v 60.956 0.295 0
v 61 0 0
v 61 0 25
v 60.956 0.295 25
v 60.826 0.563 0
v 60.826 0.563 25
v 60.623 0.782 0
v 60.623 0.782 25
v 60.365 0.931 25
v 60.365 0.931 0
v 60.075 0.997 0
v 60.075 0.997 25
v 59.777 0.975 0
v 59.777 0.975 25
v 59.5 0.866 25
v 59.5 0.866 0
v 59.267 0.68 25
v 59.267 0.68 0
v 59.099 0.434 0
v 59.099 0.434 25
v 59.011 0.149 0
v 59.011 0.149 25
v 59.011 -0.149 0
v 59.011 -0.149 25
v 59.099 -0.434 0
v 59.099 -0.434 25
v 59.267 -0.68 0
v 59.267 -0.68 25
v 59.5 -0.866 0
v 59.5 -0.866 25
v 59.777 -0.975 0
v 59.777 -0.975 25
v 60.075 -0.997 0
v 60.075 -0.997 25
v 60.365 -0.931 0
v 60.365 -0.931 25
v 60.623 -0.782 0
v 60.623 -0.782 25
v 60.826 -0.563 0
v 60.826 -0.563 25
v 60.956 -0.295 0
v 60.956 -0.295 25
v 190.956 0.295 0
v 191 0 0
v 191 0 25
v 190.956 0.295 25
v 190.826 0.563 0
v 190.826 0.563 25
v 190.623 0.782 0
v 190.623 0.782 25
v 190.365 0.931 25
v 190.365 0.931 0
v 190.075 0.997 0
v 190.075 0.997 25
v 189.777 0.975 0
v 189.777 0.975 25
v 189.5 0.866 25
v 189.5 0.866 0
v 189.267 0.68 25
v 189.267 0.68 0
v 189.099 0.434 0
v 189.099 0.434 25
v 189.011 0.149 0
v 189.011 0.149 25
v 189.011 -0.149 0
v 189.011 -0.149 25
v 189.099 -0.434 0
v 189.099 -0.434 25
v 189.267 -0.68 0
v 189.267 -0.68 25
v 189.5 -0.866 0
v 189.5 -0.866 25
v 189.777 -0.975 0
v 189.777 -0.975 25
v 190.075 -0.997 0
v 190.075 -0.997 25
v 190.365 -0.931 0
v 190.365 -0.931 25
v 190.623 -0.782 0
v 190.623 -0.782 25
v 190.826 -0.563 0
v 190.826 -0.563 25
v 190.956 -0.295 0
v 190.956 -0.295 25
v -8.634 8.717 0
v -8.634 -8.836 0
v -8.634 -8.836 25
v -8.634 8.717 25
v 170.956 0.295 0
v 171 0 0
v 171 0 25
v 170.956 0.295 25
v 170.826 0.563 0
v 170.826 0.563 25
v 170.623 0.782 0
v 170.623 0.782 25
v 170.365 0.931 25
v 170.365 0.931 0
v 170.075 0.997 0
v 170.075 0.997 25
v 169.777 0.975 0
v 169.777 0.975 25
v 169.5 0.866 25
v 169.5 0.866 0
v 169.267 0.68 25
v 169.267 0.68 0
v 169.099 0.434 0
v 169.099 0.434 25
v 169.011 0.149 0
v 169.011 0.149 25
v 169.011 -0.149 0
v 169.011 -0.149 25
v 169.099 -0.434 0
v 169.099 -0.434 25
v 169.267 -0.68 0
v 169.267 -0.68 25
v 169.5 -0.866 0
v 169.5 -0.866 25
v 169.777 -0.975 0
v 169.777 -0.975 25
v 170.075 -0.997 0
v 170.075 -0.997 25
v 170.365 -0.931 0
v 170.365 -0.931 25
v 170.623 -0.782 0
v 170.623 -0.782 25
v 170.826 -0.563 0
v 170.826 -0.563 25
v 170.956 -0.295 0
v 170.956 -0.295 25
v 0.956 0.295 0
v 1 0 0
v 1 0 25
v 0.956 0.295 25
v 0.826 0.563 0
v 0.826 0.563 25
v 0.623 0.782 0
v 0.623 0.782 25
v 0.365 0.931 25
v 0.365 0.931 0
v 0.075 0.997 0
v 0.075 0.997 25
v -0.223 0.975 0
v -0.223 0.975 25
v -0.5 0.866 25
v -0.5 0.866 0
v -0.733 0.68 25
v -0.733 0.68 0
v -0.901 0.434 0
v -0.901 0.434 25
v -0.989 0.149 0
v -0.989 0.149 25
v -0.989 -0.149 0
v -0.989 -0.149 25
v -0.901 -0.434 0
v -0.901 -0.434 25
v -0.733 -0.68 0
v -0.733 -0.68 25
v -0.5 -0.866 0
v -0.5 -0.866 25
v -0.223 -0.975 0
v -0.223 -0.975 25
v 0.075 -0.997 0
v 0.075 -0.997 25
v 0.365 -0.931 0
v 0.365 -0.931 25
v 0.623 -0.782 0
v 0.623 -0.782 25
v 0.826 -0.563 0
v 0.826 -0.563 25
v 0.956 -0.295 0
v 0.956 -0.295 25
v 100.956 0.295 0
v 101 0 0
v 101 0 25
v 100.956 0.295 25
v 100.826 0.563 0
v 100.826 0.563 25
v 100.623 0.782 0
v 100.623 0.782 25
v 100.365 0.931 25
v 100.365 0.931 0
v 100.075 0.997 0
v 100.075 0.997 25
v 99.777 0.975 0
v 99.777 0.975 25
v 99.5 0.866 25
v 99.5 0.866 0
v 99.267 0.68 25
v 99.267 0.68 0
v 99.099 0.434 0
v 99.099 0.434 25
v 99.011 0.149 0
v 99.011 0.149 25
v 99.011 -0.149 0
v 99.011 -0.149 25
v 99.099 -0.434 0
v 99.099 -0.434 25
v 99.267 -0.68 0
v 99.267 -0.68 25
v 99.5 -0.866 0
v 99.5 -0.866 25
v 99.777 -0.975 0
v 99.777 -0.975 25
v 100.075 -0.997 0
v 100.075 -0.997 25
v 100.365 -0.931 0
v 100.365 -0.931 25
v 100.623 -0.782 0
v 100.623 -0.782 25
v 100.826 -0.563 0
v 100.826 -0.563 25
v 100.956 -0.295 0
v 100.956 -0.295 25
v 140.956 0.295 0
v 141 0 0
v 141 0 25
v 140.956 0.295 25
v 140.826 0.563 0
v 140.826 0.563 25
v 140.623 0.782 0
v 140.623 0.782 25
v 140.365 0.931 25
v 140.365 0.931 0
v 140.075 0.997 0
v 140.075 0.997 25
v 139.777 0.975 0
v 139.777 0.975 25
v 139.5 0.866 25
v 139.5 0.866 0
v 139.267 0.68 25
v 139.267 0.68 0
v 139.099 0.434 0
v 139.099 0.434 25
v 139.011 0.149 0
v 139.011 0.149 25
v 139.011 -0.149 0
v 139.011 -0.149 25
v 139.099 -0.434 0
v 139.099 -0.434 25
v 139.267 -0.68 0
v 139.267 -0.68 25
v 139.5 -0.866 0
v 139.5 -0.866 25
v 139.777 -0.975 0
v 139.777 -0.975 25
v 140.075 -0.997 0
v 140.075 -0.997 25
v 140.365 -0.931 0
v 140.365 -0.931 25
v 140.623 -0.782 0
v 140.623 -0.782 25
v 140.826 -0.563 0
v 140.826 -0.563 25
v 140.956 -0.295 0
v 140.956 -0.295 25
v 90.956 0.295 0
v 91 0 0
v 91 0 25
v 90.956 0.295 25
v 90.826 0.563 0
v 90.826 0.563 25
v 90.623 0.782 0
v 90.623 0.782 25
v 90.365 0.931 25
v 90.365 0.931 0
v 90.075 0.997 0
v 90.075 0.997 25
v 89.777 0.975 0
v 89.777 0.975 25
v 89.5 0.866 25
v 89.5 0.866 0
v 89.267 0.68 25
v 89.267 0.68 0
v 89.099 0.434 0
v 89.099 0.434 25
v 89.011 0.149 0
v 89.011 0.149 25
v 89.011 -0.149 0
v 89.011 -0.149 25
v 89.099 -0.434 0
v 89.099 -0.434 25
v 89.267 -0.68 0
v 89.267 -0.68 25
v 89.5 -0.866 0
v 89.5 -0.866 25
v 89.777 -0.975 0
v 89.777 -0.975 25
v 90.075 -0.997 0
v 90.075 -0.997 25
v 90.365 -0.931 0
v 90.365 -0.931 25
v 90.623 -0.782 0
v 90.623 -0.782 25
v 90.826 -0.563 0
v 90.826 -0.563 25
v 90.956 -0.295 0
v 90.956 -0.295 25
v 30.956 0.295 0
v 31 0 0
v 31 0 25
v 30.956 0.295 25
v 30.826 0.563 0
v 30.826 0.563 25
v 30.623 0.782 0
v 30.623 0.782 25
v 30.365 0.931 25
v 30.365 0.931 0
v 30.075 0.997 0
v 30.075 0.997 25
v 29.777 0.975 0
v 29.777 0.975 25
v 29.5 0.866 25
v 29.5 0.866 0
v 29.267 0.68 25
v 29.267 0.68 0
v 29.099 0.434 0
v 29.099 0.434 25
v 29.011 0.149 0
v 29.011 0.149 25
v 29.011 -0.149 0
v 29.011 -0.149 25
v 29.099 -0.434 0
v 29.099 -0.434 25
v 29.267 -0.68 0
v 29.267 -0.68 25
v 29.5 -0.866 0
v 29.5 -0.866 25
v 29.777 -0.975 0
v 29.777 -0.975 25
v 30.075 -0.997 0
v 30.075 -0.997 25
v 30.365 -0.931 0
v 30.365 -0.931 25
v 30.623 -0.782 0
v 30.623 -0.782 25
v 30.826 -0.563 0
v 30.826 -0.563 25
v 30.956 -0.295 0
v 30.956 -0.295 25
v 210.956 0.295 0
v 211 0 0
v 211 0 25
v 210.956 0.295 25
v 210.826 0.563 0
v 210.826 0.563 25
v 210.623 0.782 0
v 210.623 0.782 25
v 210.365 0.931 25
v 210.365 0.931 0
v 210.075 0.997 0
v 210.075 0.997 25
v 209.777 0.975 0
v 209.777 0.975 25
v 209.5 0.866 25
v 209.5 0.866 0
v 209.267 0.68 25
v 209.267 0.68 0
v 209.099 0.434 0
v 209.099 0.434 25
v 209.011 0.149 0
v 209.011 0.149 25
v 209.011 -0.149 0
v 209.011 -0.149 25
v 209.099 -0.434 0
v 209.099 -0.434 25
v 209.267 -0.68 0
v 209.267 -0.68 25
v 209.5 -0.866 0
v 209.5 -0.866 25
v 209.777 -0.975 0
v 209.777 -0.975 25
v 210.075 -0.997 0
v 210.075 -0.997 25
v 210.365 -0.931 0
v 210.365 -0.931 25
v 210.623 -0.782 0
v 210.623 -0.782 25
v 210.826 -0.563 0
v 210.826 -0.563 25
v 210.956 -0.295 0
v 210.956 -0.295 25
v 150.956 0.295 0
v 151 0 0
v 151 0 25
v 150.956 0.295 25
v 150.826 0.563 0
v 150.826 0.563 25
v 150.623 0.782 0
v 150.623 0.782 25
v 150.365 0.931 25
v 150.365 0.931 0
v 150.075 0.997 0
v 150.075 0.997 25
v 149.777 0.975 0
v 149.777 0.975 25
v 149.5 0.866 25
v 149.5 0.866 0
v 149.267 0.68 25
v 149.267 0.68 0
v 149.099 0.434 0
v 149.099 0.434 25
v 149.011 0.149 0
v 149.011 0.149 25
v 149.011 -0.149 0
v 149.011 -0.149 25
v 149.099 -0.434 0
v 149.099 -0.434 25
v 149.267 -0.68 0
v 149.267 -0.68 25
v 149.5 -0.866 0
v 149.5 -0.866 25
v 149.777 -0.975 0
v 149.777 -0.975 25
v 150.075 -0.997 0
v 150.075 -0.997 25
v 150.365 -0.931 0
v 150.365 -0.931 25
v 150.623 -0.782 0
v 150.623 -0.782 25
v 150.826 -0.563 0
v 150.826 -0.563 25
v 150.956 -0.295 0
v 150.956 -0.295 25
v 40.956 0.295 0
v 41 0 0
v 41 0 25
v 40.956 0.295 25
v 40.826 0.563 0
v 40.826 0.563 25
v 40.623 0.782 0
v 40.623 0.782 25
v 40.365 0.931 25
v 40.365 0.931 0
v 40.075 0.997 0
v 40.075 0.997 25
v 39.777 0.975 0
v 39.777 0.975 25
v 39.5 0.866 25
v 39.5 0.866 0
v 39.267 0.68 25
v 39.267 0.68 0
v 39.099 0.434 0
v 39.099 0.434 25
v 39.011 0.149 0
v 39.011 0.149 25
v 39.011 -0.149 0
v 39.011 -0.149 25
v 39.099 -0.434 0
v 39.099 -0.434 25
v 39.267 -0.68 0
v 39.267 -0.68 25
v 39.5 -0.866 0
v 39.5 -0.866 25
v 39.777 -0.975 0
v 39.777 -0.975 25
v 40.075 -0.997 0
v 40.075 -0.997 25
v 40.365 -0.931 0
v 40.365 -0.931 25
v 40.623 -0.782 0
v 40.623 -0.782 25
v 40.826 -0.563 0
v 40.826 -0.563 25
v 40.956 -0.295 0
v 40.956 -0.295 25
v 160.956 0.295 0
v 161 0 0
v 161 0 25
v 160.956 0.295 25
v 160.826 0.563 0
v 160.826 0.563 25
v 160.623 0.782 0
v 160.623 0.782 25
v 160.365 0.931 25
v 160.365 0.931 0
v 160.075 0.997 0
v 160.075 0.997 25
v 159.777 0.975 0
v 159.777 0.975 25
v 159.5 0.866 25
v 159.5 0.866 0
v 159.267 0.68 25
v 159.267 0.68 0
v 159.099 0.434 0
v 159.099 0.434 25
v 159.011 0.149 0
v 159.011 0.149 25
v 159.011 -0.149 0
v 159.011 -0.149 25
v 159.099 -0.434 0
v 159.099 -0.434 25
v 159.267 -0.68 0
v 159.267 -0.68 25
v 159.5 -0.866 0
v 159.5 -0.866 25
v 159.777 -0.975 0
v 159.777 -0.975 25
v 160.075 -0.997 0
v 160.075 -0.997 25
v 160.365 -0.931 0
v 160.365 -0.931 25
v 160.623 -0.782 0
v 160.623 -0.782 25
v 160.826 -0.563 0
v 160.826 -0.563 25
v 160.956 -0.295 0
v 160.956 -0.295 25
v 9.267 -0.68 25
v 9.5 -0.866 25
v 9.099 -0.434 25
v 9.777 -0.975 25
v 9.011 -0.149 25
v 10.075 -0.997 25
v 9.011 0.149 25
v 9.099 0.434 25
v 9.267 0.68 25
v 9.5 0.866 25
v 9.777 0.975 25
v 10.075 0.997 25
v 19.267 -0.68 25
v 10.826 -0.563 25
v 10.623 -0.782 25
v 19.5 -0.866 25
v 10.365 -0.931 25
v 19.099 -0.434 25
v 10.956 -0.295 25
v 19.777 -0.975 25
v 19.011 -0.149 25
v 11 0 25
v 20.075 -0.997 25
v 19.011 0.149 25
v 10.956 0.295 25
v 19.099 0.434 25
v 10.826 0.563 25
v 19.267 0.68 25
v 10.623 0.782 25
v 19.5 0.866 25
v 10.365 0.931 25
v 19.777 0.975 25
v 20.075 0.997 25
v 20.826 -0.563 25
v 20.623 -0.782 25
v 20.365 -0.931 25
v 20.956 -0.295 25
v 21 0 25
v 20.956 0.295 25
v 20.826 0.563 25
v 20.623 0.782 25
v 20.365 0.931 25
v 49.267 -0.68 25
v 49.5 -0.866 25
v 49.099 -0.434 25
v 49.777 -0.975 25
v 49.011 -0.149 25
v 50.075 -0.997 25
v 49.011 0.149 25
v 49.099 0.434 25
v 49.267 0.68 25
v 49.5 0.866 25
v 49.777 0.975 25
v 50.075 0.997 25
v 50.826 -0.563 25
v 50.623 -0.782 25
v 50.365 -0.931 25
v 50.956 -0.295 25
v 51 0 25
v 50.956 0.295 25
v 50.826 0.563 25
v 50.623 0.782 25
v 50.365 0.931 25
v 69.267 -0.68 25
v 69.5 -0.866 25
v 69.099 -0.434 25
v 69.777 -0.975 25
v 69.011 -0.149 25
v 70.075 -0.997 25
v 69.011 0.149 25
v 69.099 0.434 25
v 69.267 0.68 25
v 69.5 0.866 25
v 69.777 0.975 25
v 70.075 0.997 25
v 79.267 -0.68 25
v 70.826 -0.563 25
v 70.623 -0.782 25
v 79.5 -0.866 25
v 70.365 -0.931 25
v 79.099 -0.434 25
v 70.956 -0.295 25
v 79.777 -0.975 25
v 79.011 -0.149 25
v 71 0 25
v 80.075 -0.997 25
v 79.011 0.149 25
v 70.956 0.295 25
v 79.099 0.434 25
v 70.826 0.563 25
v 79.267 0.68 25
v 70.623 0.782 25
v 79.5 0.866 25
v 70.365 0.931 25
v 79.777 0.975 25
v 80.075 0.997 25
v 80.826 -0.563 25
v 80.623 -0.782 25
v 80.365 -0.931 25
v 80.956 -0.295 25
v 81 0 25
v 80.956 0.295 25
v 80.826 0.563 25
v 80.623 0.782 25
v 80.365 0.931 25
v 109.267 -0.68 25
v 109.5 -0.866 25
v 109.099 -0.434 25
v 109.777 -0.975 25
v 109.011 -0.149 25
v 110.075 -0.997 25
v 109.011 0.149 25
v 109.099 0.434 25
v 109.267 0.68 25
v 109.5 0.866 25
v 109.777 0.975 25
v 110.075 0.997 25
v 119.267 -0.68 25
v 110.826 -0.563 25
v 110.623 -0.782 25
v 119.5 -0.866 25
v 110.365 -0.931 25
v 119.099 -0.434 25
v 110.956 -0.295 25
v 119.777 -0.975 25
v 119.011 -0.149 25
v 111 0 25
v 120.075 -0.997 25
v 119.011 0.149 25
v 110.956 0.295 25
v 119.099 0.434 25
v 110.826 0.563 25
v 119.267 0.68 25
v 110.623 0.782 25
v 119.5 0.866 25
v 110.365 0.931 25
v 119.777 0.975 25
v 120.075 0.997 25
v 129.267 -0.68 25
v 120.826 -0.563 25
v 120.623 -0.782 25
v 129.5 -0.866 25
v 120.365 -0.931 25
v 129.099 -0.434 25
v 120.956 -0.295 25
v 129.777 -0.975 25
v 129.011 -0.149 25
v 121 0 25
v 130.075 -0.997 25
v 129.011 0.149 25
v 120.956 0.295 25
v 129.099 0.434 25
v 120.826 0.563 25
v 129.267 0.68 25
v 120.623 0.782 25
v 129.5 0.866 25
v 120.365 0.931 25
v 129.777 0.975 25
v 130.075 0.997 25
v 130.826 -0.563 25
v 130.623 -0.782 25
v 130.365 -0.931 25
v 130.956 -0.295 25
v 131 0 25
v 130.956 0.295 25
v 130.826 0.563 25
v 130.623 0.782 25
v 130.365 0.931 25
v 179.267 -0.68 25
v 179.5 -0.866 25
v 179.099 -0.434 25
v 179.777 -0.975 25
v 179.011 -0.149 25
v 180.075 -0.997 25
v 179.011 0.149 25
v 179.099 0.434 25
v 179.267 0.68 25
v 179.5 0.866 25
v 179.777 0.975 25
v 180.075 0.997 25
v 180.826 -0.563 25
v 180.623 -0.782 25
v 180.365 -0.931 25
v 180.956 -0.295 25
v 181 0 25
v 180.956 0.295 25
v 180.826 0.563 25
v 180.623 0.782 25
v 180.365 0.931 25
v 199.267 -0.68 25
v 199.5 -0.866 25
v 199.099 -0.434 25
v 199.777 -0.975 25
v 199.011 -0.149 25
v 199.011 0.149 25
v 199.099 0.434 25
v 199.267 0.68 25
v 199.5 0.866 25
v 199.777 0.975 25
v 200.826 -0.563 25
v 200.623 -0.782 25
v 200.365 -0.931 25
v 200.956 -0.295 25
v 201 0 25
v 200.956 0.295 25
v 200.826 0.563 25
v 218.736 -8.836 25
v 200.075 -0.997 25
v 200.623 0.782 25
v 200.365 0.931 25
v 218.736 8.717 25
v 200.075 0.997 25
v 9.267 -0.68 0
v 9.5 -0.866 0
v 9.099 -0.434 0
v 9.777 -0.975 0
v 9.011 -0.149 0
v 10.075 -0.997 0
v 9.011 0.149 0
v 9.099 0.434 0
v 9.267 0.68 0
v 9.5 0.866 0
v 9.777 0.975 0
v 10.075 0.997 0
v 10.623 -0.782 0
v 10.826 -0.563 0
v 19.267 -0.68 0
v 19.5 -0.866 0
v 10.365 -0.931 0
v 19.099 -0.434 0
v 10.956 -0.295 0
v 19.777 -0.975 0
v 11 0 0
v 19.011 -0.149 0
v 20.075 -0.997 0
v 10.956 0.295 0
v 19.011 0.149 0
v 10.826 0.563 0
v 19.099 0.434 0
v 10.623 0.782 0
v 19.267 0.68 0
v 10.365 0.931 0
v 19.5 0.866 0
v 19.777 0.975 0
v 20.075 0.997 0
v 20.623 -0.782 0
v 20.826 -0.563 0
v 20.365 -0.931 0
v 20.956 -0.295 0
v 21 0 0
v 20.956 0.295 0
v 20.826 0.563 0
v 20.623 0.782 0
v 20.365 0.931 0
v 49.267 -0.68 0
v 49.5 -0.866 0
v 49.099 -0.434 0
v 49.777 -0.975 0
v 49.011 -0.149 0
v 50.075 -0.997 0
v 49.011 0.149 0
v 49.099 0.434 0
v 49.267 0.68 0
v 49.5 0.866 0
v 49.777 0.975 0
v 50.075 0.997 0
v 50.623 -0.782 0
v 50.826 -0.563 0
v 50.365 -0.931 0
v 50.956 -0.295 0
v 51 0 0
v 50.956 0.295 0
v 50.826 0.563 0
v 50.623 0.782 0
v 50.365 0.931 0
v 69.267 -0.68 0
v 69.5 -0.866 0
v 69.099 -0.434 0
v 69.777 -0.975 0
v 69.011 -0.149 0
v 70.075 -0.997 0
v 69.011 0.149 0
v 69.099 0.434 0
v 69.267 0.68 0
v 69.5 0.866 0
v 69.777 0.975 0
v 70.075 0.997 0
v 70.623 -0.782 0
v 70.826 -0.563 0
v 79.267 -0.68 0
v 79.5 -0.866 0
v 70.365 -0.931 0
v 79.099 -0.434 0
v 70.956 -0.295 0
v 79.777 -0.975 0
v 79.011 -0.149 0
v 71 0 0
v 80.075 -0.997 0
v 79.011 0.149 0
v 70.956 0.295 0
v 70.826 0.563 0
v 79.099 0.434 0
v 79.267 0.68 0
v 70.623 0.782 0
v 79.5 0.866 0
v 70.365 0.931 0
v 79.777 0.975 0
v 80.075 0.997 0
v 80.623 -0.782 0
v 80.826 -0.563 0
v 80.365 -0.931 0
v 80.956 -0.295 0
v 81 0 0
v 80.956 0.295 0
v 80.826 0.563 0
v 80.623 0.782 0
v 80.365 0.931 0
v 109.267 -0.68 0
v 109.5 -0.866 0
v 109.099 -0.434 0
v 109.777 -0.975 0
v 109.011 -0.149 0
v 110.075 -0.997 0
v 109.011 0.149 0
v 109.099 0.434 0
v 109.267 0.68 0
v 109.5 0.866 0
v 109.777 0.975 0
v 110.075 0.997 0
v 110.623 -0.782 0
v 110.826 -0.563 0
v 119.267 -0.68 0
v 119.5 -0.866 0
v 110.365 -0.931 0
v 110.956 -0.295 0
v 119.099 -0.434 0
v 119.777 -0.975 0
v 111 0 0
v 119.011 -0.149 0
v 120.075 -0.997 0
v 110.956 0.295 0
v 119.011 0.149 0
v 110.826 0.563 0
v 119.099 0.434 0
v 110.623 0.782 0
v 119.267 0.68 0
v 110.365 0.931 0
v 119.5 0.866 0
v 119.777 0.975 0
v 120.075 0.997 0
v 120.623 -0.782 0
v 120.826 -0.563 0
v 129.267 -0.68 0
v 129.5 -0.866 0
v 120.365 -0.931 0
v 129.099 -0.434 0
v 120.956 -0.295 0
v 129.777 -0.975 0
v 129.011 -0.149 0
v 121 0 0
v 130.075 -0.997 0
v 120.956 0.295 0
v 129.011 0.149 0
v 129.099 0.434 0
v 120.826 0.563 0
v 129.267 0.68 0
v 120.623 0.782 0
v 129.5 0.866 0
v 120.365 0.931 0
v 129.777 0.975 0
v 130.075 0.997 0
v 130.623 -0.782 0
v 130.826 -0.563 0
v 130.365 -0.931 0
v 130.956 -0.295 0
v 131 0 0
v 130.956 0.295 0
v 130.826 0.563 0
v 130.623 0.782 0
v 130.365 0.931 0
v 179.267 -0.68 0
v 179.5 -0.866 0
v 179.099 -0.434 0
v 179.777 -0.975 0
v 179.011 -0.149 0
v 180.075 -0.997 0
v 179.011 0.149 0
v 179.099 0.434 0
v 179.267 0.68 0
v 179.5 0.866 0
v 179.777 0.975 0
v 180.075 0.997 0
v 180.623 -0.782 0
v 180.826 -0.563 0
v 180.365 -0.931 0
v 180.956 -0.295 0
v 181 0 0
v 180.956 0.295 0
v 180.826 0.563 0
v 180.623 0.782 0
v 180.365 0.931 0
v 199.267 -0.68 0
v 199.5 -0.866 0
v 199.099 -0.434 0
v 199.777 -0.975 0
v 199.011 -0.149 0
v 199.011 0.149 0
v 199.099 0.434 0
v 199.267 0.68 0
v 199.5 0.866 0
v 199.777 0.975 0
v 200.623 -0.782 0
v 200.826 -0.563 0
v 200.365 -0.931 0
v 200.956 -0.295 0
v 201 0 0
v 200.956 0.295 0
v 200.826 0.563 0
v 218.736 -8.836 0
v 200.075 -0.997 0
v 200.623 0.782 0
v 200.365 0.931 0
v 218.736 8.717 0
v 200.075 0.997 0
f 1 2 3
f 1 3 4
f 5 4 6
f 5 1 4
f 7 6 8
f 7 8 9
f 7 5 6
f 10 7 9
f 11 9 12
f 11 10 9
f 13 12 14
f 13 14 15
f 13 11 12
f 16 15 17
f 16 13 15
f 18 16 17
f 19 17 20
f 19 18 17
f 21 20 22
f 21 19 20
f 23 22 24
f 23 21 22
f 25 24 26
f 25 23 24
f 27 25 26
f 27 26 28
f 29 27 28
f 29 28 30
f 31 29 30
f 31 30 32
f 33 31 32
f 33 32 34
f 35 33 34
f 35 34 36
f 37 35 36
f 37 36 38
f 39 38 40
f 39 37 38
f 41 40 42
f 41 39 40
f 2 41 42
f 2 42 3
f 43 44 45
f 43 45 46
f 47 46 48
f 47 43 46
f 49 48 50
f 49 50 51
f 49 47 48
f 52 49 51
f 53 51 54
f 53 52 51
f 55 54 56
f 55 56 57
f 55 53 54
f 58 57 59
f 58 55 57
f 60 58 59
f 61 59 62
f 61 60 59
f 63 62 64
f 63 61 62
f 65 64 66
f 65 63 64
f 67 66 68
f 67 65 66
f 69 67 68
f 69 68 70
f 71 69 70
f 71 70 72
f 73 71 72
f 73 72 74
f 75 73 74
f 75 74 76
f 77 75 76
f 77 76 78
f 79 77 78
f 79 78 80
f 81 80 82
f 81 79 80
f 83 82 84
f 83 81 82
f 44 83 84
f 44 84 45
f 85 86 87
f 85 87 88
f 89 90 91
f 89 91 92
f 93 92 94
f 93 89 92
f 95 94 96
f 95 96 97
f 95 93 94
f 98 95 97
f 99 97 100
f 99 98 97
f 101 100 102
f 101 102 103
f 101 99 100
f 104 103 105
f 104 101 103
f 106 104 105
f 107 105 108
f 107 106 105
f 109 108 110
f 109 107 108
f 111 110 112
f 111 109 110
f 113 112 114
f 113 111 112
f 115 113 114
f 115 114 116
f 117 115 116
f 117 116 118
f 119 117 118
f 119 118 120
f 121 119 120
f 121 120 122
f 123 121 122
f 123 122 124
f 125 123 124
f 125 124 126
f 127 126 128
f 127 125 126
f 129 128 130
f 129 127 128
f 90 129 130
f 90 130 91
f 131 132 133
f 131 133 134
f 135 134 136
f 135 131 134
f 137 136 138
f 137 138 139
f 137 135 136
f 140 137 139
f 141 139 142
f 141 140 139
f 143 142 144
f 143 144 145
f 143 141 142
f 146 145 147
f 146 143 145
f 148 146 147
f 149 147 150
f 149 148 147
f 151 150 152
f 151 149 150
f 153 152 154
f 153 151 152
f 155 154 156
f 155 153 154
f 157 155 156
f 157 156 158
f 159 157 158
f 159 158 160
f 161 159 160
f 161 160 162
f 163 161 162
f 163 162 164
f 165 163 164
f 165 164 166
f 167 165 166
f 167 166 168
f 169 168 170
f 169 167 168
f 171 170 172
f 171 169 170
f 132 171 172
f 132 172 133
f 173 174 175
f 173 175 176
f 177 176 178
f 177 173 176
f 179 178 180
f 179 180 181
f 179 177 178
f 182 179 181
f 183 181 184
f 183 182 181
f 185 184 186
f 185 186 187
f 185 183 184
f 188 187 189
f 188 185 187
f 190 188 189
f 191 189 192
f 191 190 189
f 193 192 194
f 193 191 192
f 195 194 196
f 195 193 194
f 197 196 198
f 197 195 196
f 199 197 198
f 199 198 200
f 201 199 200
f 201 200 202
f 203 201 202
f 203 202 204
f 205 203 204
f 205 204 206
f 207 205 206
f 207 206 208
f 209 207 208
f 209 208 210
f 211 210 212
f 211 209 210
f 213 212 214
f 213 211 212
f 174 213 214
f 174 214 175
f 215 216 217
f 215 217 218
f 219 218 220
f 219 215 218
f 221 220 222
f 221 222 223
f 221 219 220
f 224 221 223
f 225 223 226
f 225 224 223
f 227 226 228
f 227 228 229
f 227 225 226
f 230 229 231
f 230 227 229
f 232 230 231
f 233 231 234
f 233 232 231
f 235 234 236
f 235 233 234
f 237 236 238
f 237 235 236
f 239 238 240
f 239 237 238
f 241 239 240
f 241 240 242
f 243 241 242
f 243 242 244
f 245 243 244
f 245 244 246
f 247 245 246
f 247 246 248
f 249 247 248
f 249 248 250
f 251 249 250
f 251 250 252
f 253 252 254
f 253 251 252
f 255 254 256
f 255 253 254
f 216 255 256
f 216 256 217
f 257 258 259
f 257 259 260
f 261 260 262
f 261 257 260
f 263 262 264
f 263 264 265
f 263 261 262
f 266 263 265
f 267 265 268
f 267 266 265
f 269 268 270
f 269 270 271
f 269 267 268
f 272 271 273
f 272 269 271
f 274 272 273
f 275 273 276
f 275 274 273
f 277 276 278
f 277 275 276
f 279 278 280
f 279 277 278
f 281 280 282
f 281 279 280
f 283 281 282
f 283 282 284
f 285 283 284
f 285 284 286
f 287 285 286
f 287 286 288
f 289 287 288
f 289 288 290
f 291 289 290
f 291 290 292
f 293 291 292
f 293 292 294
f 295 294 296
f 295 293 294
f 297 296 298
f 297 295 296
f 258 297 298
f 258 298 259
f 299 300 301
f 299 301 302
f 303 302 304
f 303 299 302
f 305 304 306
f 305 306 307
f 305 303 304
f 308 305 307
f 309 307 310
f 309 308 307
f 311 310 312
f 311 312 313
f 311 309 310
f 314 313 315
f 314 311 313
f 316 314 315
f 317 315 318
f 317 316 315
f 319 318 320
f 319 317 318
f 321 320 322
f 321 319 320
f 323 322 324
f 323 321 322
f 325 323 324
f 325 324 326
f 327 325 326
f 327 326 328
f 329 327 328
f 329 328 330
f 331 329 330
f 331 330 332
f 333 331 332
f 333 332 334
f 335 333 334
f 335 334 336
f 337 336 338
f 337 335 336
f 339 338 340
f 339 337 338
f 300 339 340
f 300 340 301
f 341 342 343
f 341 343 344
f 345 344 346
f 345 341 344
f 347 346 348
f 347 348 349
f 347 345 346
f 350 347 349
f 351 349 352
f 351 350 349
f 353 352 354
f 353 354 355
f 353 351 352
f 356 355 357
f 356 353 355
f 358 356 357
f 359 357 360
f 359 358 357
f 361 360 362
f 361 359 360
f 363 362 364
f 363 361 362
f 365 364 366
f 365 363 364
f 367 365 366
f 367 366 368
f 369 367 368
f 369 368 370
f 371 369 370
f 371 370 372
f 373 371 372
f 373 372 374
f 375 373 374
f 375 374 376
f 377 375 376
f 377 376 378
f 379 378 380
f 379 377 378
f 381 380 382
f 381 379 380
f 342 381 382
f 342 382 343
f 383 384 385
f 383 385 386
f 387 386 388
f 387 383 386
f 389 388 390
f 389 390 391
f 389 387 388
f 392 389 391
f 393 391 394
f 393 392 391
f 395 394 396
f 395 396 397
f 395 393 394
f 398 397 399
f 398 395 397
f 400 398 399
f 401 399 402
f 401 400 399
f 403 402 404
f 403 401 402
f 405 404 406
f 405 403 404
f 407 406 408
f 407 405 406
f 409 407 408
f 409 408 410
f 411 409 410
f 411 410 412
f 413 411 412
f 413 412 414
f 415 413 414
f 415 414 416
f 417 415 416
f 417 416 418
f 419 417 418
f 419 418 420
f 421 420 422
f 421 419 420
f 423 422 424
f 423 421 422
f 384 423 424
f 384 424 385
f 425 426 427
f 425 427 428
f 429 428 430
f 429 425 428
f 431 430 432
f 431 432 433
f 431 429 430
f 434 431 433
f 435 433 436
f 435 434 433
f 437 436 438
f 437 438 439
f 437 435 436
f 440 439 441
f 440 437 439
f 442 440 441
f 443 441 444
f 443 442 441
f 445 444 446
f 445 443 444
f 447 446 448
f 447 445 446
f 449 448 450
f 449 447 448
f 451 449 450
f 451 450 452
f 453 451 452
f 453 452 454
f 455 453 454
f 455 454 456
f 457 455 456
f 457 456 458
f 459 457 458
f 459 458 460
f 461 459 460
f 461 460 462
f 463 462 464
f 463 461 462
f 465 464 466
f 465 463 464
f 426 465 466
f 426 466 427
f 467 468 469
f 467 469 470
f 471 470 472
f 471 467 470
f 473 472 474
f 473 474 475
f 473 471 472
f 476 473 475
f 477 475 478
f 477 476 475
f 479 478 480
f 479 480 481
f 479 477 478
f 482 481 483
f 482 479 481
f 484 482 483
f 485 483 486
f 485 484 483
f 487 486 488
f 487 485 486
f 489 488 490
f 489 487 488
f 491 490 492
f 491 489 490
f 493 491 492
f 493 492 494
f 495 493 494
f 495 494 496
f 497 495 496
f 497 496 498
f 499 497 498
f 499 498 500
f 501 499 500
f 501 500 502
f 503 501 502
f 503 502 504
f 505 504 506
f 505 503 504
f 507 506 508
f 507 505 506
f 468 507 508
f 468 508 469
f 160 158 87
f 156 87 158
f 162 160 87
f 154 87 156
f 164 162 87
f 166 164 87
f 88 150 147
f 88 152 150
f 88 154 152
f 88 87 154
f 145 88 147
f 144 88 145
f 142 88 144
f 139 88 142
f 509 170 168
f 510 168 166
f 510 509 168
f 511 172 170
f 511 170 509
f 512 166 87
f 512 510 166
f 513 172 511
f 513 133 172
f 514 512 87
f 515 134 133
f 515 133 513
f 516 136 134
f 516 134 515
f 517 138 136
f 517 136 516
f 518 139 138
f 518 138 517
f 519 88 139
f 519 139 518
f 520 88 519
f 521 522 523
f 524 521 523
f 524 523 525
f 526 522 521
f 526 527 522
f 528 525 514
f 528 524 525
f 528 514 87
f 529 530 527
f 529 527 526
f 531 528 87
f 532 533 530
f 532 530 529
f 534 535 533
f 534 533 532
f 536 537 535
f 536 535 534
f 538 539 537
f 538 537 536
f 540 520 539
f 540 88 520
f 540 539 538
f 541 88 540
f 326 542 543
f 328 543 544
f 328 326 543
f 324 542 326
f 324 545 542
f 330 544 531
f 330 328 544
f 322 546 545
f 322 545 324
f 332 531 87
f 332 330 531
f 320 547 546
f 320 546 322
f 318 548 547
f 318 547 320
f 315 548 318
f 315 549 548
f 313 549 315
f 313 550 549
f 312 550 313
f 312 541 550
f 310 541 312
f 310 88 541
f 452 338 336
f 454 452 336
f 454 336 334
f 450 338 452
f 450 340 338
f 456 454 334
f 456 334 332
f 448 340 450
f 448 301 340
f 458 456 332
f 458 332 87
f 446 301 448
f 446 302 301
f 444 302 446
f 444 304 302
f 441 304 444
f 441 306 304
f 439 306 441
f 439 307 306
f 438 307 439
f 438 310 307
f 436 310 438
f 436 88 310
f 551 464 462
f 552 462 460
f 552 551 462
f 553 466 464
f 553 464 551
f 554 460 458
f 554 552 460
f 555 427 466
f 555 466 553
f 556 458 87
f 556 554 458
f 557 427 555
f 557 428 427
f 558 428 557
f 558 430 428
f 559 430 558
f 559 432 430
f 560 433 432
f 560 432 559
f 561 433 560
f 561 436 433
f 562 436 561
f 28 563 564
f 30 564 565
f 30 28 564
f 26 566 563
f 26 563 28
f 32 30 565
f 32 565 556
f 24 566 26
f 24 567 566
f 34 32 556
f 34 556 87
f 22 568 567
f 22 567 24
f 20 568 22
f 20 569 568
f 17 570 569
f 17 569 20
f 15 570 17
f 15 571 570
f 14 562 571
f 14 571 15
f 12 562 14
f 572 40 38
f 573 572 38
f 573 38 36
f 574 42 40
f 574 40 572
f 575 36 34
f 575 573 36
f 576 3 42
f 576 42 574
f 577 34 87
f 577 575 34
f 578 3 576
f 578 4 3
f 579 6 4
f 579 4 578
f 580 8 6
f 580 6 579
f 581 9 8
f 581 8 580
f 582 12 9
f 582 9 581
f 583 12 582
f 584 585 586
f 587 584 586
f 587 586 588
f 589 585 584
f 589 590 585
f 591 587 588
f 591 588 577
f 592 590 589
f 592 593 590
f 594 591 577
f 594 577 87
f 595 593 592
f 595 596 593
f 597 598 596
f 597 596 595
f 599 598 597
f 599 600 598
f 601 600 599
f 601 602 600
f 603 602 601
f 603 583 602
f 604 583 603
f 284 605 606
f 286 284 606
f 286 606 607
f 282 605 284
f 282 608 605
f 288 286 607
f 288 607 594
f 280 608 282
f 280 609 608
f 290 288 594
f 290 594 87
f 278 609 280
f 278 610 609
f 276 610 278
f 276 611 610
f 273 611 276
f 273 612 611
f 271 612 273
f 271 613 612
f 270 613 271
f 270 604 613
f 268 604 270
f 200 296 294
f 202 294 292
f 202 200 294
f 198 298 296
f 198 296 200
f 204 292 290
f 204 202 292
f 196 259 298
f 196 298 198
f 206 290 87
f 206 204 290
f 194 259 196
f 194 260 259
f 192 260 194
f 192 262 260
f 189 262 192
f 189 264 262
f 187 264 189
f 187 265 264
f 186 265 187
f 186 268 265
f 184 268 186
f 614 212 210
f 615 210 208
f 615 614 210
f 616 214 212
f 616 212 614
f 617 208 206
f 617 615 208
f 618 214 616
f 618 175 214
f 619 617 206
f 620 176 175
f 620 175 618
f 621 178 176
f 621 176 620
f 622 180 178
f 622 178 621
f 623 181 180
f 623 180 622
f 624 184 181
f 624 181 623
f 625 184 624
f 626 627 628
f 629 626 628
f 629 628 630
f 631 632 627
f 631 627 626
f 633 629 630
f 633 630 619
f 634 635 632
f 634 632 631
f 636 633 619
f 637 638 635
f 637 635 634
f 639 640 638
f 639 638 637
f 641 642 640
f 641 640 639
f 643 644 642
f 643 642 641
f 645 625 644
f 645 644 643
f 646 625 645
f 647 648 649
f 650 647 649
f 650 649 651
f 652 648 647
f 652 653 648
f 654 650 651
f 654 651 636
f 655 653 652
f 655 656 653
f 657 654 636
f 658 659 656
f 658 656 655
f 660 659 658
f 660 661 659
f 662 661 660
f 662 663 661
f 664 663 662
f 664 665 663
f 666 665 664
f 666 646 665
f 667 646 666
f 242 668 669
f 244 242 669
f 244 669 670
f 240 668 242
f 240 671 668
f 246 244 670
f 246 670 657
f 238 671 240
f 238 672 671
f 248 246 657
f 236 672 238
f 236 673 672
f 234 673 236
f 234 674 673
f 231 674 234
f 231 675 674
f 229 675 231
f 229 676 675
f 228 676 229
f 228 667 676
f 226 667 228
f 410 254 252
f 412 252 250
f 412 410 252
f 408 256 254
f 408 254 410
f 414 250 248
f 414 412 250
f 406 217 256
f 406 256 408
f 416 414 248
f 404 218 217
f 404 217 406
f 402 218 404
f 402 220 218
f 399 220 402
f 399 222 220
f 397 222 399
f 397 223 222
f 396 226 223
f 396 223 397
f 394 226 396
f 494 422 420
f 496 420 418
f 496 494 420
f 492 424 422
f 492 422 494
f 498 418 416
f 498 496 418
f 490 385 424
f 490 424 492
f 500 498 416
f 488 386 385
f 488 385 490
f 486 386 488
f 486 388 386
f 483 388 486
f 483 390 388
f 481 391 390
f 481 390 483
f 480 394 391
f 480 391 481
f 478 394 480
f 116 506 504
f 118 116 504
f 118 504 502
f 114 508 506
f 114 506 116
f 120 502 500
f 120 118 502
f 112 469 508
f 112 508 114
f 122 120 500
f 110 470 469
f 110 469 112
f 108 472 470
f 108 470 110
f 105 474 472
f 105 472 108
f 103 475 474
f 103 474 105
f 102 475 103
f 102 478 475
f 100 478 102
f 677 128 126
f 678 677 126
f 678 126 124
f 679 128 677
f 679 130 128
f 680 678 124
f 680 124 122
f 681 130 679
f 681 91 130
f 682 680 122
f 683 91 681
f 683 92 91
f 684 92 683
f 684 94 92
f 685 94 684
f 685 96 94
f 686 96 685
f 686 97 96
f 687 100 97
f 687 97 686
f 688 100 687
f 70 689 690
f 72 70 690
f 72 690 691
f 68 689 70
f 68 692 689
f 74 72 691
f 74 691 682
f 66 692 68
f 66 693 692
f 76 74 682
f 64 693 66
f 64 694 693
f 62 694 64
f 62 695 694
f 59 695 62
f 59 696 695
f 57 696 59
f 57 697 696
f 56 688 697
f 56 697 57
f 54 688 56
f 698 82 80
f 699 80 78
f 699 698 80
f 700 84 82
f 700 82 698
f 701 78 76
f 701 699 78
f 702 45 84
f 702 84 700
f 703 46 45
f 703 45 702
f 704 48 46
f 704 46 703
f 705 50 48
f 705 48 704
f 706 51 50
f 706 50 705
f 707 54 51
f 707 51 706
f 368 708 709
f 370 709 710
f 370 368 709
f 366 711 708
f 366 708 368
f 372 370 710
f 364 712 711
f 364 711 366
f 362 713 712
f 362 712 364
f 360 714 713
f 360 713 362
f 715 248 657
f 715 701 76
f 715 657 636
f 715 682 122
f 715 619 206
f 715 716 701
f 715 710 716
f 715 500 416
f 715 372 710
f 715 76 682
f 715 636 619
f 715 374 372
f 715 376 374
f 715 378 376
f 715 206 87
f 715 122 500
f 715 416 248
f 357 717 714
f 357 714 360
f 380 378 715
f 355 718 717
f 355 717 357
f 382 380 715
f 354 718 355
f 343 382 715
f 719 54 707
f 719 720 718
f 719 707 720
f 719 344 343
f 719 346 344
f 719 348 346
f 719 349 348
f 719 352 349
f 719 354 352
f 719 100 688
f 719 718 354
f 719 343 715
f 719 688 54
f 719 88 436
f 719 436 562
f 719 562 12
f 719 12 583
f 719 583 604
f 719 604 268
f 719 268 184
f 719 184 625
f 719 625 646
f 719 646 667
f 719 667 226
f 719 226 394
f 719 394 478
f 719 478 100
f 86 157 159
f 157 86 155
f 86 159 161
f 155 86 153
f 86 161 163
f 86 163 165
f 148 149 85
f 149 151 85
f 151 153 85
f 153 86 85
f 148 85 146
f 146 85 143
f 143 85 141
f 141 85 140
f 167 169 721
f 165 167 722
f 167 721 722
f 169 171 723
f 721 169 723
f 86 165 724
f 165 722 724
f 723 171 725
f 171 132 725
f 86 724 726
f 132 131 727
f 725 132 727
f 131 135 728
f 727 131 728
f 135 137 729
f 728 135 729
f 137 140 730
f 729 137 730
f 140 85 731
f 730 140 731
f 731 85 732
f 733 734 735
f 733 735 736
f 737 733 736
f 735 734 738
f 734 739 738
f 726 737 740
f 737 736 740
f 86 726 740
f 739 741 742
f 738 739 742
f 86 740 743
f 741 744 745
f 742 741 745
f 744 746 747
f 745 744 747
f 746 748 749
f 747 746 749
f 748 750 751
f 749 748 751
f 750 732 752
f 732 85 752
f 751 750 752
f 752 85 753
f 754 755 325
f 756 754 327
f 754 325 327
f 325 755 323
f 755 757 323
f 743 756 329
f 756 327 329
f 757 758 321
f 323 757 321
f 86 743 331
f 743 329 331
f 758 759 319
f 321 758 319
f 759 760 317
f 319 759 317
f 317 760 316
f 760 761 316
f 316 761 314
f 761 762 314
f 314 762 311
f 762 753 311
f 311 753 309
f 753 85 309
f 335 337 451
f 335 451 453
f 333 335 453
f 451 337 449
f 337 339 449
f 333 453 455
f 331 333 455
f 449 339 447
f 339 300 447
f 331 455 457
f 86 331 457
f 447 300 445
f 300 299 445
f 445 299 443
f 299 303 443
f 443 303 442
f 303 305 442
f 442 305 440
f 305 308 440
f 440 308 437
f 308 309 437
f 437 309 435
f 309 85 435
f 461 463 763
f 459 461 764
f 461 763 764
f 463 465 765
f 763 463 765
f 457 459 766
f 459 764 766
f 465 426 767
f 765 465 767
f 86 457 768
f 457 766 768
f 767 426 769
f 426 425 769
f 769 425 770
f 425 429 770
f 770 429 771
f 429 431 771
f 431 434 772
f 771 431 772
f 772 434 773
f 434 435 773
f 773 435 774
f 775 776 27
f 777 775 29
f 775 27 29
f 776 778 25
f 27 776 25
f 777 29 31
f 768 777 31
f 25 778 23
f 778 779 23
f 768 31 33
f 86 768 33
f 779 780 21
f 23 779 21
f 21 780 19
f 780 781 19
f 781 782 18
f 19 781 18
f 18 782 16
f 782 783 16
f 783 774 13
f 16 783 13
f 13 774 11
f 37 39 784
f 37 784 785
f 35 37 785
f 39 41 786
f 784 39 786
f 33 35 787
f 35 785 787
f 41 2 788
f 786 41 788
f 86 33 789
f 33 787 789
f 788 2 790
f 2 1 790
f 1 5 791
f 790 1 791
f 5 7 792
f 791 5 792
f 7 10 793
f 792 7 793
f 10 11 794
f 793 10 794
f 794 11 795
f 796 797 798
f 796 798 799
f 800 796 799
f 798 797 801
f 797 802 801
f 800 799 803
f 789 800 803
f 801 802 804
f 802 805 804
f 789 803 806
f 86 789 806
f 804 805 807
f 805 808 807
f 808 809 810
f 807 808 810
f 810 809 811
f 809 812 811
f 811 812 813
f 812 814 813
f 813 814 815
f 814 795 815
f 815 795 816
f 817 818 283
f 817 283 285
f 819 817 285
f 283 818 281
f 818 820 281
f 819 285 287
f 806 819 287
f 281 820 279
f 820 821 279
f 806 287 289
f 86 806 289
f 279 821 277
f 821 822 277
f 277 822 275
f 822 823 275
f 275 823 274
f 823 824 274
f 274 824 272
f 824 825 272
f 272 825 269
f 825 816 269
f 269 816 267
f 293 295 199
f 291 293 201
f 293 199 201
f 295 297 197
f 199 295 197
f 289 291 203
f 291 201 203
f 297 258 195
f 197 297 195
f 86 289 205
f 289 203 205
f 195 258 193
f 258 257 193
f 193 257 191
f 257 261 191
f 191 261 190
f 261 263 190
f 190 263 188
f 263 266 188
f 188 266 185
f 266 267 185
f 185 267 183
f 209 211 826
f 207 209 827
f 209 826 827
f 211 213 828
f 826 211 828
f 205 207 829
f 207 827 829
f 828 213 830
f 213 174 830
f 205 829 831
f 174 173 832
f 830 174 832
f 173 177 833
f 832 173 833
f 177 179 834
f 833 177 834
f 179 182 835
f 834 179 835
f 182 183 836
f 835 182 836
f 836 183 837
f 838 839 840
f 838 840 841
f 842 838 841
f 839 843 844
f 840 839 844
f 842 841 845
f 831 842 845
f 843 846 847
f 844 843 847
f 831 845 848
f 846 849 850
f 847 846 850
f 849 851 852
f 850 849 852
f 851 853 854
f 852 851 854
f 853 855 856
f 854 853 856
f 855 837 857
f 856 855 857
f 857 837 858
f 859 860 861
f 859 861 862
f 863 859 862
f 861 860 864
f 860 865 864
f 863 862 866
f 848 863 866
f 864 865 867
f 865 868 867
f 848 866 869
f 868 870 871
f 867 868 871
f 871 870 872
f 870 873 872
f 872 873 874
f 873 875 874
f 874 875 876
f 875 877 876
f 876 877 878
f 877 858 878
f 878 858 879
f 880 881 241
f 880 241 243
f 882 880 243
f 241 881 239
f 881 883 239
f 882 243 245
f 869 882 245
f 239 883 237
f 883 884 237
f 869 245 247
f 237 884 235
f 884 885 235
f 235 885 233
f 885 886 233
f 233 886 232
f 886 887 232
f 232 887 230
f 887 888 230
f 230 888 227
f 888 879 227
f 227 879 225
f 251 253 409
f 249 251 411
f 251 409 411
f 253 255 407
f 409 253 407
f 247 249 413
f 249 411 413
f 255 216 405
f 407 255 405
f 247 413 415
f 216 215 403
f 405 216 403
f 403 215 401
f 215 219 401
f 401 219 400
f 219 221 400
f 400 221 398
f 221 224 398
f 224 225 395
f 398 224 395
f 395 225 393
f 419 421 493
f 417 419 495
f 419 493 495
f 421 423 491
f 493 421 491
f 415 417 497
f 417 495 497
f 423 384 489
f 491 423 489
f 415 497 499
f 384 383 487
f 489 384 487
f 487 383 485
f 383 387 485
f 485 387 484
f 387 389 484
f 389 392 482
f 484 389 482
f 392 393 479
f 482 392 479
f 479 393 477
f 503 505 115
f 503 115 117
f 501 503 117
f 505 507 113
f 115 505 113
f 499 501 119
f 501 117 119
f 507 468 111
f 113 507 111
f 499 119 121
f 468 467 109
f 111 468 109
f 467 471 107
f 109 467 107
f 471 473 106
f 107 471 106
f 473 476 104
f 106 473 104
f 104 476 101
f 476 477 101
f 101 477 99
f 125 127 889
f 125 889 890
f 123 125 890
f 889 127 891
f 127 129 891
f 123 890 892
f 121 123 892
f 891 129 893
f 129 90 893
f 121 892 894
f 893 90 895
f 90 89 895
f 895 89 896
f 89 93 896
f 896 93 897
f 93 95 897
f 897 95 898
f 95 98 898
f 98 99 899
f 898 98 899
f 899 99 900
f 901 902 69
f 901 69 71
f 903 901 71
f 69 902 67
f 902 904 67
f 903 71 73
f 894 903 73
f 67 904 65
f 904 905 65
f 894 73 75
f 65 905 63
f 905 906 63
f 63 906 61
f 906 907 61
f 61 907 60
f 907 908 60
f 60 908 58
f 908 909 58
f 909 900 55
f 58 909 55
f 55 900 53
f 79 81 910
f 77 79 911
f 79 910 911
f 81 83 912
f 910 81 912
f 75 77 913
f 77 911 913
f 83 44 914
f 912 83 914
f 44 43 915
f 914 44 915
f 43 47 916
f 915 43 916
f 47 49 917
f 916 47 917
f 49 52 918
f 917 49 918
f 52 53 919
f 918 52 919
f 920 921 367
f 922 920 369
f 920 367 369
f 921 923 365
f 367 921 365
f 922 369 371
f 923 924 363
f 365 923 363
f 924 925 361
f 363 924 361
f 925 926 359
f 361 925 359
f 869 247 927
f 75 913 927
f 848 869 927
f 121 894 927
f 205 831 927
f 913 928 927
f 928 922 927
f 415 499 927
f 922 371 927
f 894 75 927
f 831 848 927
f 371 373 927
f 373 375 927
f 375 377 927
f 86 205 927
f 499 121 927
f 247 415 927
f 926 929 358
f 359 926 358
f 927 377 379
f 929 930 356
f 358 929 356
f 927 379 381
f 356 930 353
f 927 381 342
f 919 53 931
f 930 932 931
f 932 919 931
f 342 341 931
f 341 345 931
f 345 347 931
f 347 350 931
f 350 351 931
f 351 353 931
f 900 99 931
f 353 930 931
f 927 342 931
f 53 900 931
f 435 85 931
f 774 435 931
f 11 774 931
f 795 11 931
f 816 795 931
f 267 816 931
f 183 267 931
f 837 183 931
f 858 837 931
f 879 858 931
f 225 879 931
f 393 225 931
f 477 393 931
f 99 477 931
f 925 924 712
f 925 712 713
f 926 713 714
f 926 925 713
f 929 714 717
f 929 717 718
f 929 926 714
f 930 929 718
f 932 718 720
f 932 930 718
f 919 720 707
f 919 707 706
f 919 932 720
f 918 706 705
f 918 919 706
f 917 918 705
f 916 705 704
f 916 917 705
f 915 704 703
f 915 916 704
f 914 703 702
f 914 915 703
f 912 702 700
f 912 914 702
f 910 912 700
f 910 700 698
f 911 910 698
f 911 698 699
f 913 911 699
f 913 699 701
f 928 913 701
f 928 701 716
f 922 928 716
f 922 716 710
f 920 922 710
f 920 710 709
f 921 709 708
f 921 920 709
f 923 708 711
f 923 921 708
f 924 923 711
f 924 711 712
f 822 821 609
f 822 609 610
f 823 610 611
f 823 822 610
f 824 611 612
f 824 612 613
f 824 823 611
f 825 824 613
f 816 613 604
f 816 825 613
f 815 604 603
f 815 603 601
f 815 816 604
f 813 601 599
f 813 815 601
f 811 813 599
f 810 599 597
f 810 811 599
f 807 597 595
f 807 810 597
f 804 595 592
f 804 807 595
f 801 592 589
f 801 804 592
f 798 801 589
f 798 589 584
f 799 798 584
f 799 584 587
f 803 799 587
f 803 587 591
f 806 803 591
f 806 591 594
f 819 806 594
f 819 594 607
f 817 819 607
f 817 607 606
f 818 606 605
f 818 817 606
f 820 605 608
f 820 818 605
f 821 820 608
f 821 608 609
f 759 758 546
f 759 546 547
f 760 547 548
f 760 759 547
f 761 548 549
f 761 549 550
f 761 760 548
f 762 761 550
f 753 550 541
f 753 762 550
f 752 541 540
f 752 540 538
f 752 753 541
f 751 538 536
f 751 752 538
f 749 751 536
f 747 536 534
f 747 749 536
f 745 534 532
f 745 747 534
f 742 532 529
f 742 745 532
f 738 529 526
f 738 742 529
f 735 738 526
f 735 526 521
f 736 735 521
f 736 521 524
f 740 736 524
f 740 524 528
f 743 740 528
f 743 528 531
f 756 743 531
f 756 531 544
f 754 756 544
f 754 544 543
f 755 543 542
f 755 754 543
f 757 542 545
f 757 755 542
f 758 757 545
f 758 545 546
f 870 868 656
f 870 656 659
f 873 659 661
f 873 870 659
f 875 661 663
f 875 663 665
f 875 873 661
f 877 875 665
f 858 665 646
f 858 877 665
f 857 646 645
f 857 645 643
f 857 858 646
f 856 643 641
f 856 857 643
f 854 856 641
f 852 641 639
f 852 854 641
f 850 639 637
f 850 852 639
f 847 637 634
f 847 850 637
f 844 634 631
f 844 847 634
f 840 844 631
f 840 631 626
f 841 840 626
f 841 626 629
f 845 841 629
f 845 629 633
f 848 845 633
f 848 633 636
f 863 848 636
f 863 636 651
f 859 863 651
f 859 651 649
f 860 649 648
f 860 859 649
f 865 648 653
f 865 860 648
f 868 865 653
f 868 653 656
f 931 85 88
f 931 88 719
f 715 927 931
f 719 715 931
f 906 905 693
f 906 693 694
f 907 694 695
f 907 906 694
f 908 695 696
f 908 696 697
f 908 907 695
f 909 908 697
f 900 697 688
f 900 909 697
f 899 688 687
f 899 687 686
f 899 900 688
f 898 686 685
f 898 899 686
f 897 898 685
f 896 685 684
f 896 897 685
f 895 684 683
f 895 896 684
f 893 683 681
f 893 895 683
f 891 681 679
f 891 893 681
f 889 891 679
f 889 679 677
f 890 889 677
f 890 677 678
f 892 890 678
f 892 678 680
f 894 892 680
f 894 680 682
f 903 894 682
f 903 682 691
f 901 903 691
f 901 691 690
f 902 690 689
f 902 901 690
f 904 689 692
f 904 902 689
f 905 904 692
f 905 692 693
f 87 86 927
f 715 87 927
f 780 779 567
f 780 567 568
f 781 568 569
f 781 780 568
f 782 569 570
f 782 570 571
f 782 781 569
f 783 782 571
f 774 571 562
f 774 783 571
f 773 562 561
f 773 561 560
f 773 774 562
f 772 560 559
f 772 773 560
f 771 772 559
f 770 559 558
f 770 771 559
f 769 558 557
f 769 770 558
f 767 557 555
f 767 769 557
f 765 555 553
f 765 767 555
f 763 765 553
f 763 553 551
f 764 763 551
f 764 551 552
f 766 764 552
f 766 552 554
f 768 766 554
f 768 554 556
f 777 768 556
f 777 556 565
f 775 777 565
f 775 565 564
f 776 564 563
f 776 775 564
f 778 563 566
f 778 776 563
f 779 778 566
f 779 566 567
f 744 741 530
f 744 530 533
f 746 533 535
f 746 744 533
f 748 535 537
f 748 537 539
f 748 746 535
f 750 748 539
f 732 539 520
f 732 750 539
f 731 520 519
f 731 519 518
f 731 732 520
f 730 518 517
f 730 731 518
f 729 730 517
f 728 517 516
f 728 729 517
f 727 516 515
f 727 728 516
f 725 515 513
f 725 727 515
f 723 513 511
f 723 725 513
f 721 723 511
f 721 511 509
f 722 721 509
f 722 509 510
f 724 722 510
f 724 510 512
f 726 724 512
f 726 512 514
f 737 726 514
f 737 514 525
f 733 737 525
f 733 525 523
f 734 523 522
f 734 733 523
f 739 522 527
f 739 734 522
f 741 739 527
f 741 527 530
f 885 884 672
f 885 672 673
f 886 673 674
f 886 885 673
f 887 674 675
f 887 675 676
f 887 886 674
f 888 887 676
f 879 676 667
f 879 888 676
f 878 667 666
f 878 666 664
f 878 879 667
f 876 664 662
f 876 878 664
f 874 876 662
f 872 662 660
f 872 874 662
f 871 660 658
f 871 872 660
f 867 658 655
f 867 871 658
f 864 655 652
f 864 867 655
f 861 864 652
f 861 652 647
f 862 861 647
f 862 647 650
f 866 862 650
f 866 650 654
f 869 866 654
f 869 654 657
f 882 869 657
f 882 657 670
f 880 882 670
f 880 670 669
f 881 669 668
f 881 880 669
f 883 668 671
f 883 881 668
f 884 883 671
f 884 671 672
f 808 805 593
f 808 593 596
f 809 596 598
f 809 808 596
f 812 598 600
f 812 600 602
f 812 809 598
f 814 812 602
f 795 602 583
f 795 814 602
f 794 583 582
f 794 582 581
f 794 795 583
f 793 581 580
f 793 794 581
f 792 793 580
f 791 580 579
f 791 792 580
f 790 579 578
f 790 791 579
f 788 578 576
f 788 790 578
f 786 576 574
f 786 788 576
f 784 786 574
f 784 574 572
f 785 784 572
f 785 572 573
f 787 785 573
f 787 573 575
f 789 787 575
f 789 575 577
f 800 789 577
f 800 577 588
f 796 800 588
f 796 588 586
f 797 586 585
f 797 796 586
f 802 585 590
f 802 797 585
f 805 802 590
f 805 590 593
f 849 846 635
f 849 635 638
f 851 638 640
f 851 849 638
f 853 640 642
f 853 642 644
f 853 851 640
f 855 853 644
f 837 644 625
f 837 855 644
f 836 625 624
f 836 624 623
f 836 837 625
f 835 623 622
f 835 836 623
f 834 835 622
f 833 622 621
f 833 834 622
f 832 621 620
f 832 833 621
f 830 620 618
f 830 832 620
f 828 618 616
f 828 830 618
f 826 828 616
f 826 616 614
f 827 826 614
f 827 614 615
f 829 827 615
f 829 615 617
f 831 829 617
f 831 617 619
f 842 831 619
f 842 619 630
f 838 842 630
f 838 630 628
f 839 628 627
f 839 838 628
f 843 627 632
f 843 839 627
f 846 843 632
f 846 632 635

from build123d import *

# Parameters (mm, degrees)
F0_W     = 227.369168
F0_H     = 17.553229
F0_R     = 1
F1_DEPTH = 25


with BuildPart() as f1:
    # F0 (on Top) → F1 (new body)
    with BuildSketch(Plane.XY):
        with Locations((105.051066, -0.059635)):
            Rectangle(F0_W, F0_H)
        Circle(F0_R, mode=Mode.SUBTRACT)
        with Locations((10, 0)):
            Circle(F0_R, mode=Mode.SUBTRACT)
        with Locations((20, 0)):
            Circle(F0_R, mode=Mode.SUBTRACT)
        with Locations((30, 0)):
            Circle(F0_R, mode=Mode.SUBTRACT)
        with Locations((40, 0)):
            Circle(F0_R, mode=Mode.SUBTRACT)
        with Locations((50, 0)):
            Circle(F0_R, mode=Mode.SUBTRACT)
        with Locations((60, 0)):
            Circle(F0_R, mode=Mode.SUBTRACT)
        with Locations((70, 0)):
            Circle(F0_R, mode=Mode.SUBTRACT)
        with Locations((80, 0)):
            Circle(F0_R, mode=Mode.SUBTRACT)
        with Locations((90, 0)):
            Circle(F0_R, mode=Mode.SUBTRACT)
        with Locations((100, 0)):
            Circle(F0_R, mode=Mode.SUBTRACT)
        with Locations((110, 0)):
            Circle(F0_R, mode=Mode.SUBTRACT)
        with Locations((120, 0)):
            Circle(F0_R, mode=Mode.SUBTRACT)
        with Locations((130, 0)):
            Circle(F0_R, mode=Mode.SUBTRACT)
        with Locations((140, 0)):
            Circle(F0_R, mode=Mode.SUBTRACT)
        with Locations((150, 0)):
            Circle(F0_R, mode=Mode.SUBTRACT)
        with Locations((160, 0)):
            Circle(F0_R, mode=Mode.SUBTRACT)
        with Locations((170, 0)):
            Circle(F0_R, mode=Mode.SUBTRACT)
        with Locations((180, 0)):
            Circle(F0_R, mode=Mode.SUBTRACT)
        with Locations((190, 0)):
            Circle(F0_R, mode=Mode.SUBTRACT)
        with Locations((200, 0)):
            Circle(F0_R, mode=Mode.SUBTRACT)
        with Locations((210, 0)):
            Circle(F0_R, mode=Mode.SUBTRACT)
    extrude(amount=F1_DEPTH)


solid = f1.part
